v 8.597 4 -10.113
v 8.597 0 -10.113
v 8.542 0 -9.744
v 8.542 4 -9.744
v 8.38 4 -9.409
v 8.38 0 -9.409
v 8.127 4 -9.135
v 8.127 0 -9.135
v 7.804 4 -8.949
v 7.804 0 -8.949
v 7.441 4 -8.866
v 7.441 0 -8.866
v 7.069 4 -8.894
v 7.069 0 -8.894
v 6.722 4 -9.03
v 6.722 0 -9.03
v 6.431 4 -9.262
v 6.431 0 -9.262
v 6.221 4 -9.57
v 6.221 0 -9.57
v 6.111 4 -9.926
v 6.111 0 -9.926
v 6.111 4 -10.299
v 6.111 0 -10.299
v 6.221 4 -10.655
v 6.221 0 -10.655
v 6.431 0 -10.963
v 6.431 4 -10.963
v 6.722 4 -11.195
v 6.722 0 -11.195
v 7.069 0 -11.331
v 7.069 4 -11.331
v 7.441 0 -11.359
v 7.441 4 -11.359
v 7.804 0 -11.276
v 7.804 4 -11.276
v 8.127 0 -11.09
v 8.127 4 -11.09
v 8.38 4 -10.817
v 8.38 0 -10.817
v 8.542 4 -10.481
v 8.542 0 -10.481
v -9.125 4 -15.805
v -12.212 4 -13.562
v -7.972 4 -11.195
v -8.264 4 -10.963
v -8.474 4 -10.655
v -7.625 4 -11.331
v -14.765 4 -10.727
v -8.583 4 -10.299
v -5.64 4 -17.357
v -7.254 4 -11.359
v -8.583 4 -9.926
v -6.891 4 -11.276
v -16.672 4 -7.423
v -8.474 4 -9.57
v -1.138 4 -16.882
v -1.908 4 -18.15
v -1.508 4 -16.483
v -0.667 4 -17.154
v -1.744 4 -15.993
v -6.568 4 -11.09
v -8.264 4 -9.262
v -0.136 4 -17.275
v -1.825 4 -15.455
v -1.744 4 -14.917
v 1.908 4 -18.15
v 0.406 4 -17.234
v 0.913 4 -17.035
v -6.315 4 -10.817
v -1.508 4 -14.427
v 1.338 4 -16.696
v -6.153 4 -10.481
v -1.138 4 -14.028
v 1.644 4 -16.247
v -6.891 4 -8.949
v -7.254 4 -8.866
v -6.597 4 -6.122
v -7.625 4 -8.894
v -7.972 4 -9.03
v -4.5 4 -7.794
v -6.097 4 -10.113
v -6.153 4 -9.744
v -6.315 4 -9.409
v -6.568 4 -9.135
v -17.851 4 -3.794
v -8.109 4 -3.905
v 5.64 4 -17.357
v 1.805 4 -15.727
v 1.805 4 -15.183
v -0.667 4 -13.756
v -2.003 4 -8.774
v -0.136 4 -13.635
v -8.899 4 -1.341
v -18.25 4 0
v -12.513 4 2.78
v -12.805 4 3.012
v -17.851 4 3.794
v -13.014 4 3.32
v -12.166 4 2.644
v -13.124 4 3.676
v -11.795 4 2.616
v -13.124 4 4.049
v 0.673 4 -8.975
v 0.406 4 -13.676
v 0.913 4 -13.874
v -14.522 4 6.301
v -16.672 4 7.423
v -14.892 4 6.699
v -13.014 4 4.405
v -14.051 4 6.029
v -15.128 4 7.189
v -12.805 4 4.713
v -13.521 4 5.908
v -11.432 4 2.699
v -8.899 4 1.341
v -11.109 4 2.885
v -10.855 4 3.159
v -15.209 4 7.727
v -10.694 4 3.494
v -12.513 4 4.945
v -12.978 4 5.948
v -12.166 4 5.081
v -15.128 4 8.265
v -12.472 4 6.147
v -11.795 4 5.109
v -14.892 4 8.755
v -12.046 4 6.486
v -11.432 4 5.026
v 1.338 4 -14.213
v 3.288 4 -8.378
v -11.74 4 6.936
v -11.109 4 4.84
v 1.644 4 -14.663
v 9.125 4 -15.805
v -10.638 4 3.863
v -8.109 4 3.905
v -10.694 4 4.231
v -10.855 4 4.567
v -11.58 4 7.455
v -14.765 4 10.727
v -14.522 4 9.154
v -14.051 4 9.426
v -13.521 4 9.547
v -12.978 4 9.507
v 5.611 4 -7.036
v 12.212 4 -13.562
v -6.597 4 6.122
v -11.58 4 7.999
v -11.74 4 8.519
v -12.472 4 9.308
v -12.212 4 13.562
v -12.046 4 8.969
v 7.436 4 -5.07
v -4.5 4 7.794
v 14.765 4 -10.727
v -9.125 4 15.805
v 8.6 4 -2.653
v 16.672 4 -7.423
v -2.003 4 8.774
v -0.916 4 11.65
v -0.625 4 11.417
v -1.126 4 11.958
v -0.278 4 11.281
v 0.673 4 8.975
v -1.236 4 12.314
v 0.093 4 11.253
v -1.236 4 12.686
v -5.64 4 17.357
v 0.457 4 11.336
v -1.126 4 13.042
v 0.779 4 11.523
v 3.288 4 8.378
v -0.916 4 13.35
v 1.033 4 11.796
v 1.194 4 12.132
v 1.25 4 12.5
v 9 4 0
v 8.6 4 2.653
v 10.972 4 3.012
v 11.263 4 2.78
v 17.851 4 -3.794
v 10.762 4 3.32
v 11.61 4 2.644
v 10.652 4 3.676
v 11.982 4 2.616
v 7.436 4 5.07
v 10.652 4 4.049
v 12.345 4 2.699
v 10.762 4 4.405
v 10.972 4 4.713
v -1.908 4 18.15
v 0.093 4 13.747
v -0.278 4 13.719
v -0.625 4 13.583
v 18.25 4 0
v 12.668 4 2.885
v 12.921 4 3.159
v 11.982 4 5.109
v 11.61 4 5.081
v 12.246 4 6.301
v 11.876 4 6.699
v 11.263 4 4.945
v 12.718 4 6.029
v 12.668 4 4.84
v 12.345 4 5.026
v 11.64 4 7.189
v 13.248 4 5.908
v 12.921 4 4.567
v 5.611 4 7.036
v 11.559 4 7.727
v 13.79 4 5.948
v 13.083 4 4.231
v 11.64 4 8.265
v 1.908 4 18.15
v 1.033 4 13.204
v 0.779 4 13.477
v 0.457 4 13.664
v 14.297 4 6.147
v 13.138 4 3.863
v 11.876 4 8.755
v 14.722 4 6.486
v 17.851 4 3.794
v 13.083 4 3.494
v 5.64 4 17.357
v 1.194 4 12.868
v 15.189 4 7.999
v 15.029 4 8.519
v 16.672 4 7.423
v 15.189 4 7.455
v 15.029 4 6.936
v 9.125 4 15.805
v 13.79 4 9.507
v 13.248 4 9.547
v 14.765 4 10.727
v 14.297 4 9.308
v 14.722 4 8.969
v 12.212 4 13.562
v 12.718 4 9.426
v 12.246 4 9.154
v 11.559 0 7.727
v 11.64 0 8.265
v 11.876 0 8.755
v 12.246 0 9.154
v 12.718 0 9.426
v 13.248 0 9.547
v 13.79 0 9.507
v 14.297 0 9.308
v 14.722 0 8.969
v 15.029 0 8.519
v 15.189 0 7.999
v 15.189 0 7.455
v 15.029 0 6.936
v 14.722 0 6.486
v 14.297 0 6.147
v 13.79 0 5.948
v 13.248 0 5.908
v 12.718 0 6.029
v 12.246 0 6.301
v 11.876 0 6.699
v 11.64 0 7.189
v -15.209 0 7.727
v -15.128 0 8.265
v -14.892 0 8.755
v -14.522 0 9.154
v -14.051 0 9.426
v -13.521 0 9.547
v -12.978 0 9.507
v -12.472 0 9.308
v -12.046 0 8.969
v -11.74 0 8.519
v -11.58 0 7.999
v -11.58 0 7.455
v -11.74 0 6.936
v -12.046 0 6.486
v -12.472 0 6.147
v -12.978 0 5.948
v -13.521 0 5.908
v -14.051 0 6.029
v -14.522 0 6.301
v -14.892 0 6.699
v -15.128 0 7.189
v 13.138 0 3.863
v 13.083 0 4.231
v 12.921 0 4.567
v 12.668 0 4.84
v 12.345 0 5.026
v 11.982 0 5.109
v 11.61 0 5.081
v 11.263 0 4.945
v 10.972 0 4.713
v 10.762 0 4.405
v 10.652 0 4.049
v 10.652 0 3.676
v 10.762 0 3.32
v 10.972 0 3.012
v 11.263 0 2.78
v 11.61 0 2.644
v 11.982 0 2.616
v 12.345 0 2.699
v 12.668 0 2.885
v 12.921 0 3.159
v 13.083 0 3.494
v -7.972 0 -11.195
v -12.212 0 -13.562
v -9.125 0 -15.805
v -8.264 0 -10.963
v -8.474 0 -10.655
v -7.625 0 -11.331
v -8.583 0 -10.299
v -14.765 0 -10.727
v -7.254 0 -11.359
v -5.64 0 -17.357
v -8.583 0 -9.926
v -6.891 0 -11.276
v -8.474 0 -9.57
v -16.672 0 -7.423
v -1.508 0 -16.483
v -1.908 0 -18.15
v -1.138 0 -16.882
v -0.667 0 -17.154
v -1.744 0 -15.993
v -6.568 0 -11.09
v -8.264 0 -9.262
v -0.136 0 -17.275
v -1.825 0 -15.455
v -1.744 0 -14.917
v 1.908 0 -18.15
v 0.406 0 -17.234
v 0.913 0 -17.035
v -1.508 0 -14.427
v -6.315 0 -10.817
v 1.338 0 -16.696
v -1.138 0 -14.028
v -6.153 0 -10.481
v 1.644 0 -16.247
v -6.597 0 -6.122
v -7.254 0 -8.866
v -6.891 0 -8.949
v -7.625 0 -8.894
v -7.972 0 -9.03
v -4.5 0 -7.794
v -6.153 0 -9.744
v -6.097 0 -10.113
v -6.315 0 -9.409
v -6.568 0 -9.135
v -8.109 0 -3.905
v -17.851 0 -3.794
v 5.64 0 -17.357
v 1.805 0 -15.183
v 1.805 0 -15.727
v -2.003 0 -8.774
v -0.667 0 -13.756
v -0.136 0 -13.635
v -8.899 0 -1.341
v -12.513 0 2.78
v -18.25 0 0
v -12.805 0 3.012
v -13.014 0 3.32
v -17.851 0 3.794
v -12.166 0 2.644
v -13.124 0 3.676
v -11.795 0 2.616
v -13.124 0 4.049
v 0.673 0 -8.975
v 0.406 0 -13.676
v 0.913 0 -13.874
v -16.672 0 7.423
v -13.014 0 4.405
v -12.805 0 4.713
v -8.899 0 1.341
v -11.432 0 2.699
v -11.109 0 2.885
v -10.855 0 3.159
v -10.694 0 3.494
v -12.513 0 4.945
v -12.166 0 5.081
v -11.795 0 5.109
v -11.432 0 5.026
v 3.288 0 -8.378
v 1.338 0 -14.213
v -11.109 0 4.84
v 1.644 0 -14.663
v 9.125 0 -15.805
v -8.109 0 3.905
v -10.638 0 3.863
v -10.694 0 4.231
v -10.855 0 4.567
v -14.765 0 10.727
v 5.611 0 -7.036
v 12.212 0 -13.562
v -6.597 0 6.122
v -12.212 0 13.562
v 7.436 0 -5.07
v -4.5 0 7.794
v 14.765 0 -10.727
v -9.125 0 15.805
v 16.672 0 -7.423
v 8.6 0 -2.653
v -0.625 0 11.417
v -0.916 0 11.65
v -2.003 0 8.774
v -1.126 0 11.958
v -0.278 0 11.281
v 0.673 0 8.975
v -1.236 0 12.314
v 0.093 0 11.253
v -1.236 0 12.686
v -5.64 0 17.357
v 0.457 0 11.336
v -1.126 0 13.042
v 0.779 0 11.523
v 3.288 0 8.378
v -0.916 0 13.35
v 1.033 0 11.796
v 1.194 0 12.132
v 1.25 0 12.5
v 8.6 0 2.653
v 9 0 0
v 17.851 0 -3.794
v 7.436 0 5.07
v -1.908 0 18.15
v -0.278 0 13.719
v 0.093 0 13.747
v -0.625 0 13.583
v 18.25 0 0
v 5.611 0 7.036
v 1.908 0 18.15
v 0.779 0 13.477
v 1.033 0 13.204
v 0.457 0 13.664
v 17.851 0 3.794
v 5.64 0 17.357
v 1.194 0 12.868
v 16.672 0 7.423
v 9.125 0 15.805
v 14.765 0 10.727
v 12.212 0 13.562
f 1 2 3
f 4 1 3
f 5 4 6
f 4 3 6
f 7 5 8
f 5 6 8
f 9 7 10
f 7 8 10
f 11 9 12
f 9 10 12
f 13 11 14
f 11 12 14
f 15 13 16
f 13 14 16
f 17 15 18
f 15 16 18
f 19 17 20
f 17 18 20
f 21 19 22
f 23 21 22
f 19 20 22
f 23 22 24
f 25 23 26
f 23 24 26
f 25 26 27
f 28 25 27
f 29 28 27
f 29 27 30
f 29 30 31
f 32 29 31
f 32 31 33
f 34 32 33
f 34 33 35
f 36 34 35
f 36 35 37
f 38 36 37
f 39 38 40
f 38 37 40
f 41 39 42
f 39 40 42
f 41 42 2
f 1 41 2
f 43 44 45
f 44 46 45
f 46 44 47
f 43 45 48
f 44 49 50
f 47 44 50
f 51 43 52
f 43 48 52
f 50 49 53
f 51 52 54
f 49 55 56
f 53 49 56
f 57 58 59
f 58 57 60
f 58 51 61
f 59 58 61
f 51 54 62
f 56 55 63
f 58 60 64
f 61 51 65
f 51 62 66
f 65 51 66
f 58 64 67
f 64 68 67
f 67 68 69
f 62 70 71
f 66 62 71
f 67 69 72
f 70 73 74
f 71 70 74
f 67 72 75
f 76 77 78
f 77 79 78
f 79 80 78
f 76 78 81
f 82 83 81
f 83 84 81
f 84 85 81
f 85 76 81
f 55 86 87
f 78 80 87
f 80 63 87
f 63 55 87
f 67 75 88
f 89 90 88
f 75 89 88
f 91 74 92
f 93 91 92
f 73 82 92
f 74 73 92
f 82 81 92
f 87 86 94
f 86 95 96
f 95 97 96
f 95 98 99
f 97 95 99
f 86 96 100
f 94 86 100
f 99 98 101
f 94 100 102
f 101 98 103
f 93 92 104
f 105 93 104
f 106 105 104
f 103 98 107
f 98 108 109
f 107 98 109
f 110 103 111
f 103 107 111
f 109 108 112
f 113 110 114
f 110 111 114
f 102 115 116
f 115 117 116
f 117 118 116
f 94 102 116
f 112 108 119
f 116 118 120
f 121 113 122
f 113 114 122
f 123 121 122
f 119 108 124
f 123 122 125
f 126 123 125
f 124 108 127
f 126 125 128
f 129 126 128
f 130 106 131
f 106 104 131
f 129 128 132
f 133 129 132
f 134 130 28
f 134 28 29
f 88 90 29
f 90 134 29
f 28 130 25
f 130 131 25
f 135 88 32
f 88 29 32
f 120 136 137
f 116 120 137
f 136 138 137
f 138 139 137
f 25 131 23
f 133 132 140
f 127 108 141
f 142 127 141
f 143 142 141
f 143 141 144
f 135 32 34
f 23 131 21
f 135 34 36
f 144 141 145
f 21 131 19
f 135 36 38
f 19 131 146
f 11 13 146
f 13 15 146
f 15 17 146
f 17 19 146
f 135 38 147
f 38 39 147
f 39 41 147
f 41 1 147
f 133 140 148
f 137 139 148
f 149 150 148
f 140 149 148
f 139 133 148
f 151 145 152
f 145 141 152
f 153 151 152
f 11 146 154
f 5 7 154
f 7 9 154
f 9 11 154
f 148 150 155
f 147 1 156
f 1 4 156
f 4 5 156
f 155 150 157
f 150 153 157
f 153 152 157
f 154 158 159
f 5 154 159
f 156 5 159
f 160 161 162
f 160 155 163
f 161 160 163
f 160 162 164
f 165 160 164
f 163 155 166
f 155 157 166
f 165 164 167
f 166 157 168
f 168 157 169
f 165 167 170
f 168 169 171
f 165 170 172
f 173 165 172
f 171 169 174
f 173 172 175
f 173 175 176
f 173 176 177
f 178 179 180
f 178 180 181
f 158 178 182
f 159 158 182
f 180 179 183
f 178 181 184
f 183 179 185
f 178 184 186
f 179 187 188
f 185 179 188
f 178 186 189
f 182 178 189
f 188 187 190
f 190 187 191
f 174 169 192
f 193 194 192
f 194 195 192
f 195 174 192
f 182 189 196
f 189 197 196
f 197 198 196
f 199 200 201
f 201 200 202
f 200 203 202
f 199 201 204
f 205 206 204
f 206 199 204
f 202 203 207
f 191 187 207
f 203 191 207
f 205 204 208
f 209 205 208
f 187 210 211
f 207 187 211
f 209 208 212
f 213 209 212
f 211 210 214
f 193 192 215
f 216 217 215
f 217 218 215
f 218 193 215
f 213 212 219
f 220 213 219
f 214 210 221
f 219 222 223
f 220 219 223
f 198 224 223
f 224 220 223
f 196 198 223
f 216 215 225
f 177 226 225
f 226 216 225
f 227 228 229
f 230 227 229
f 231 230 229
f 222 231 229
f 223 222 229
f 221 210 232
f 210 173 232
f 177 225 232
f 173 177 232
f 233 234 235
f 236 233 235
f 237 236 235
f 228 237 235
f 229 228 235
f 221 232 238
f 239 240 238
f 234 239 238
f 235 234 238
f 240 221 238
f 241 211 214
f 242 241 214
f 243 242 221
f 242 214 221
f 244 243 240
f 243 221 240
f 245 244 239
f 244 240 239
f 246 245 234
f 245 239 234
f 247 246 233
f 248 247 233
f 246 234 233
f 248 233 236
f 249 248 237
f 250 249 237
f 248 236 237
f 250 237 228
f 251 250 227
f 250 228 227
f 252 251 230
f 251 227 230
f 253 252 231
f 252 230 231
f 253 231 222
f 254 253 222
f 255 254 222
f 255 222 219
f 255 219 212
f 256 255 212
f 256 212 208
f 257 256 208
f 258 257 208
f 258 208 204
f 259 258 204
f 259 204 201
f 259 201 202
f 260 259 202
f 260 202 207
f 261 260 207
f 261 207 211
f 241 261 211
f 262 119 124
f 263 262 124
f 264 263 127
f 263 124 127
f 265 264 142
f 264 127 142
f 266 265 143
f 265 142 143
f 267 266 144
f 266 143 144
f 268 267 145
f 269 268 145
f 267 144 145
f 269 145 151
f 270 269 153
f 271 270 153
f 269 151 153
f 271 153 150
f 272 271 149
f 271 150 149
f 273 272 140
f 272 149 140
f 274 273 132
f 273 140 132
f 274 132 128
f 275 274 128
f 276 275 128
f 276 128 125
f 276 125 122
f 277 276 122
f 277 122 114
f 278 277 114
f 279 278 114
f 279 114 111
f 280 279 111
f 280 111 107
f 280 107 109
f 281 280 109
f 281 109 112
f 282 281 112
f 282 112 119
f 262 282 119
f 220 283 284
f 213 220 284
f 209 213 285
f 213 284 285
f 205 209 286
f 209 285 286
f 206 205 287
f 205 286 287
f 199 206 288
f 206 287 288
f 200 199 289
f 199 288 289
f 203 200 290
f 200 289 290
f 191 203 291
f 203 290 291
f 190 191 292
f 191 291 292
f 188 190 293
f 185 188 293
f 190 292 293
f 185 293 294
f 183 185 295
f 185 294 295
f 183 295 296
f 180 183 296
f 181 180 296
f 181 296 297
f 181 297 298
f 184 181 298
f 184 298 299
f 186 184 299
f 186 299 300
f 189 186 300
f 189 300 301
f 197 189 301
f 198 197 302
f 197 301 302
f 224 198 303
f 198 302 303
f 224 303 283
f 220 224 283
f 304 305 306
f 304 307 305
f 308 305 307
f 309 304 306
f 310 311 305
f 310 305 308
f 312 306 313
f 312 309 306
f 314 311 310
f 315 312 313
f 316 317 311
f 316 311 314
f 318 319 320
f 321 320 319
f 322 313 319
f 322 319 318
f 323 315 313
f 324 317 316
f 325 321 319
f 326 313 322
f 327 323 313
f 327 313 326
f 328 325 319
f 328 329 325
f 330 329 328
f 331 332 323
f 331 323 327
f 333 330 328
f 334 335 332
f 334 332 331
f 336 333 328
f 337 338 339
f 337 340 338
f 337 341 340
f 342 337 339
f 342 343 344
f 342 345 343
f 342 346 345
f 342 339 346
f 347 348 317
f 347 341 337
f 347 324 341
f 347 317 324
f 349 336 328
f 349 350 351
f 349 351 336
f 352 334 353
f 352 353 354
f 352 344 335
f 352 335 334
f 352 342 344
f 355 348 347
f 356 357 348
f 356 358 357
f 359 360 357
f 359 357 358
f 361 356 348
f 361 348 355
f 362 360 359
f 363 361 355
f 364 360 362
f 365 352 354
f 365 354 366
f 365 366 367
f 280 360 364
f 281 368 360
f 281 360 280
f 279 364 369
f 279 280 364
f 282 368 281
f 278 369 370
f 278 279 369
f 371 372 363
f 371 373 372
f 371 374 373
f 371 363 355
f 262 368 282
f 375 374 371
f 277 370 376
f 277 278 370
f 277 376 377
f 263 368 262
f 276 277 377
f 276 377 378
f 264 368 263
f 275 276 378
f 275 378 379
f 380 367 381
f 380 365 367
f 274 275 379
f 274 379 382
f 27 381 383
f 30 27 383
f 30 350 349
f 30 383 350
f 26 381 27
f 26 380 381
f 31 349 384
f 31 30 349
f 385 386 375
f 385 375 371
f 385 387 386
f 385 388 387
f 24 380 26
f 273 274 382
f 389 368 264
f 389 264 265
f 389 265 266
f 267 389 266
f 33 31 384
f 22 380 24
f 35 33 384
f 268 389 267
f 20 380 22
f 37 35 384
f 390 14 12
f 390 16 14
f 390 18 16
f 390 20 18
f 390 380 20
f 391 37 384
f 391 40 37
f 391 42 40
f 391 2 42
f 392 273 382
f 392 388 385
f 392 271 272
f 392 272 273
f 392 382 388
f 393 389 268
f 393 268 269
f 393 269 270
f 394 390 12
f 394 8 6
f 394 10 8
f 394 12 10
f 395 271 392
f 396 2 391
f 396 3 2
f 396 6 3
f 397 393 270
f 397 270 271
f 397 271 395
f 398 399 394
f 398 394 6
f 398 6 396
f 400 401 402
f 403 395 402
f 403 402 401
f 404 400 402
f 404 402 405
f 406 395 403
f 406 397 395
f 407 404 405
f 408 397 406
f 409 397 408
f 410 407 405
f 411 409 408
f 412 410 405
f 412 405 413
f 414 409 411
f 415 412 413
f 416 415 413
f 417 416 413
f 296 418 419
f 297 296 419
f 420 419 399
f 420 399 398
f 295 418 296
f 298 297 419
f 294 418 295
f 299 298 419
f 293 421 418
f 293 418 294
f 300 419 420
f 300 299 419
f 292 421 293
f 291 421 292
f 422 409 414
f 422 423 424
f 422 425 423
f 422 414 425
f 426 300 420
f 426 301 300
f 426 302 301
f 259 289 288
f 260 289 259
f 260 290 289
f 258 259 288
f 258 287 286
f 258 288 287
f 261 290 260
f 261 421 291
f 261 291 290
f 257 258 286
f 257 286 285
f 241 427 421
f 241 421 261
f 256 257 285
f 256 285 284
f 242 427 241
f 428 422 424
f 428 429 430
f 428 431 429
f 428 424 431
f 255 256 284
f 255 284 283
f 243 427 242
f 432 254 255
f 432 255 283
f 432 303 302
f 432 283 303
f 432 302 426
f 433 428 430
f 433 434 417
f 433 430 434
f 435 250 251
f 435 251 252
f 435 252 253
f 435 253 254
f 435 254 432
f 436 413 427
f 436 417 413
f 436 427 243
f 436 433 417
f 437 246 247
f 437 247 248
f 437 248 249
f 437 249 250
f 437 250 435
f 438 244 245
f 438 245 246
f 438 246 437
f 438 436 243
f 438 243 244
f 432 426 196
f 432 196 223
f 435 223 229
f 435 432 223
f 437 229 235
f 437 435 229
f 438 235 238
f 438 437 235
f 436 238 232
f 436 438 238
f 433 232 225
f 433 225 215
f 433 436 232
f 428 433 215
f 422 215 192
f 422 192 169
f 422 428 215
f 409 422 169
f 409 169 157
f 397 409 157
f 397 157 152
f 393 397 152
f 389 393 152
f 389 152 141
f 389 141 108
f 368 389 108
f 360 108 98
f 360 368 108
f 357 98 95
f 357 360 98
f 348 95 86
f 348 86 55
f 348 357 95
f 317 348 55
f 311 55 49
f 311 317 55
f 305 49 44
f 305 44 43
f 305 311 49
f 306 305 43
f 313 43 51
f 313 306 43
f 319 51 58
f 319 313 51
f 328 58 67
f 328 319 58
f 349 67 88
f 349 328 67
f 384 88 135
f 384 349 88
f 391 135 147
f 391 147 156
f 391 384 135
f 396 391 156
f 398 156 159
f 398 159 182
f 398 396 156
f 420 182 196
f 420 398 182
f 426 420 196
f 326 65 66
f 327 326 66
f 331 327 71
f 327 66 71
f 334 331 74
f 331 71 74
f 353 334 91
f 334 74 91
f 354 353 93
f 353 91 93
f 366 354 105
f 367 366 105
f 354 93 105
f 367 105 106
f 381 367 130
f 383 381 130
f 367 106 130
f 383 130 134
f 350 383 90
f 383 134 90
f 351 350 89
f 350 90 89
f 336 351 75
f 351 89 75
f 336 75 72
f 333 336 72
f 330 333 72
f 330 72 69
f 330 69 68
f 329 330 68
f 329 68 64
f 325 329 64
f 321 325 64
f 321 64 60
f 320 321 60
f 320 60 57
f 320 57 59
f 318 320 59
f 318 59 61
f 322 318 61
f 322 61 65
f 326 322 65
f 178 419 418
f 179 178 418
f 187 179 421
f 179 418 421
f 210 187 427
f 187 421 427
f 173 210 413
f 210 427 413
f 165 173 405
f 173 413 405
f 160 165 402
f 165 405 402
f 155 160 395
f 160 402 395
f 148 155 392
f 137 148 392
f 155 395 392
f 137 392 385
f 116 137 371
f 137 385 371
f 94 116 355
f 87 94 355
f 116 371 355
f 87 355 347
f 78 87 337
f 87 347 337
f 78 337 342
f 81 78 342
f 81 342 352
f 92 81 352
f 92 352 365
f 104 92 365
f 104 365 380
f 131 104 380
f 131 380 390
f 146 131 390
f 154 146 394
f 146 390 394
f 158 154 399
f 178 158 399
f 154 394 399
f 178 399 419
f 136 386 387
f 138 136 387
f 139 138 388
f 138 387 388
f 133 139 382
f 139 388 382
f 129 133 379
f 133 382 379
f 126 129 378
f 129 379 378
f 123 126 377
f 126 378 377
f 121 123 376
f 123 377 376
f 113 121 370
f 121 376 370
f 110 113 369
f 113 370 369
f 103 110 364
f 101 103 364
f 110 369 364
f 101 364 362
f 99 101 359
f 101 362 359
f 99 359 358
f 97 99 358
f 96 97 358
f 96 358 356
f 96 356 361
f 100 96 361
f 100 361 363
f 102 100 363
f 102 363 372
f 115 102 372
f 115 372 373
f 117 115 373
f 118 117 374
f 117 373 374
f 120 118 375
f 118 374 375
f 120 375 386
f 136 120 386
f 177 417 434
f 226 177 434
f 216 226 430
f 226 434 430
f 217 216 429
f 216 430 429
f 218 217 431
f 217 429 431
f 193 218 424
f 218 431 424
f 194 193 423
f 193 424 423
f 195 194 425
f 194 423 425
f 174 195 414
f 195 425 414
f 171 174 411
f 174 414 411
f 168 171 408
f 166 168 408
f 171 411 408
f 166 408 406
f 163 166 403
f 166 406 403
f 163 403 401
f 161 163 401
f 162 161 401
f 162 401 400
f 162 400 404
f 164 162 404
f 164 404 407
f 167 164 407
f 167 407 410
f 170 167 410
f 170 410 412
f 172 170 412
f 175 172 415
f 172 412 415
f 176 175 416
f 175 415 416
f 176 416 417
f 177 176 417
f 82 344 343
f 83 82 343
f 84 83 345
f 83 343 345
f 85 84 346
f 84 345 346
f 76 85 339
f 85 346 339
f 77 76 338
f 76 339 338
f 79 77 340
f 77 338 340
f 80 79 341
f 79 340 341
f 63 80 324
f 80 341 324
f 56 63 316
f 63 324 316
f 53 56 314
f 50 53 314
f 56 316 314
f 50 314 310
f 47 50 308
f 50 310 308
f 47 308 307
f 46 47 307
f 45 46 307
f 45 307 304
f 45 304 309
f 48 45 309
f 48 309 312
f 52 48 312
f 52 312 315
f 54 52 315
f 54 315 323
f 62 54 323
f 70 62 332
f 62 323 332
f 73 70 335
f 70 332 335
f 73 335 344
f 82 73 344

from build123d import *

# Parameters (mm, degrees)
F0_R     = 18.25
F0_R_2   = 1.25
F0_R_3   = 9
F1_DEPTH = 4
F2_R     = 1.825
F3_DEPTH = 25


with BuildPart() as f1:
    # F0 (on Front) → F1 (new body)
    with BuildSketch(Plane.XZ):
        Circle(F0_R)
        with Locations((-7.347316, -10.112712)):
            Circle(F0_R_2, mode=Mode.SUBTRACT)
        with Locations((7.347316, -10.112712)):
            Circle(F0_R_2, mode=Mode.SUBTRACT)
        with Locations((-11.888206, 3.862712)):
            Circle(F0_R_2, mode=Mode.SUBTRACT)
        Circle(F0_R_3, mode=Mode.SUBTRACT)
        with Locations((11.888206, 3.862712)):
            Circle(F0_R_2, mode=Mode.SUBTRACT)
        with Locations((0, 12.5)):
            Circle(F0_R_2, mode=Mode.SUBTRACT)
    extrude(amount=-F1_DEPTH)

    # F2 (on face) → F3 (cut)
    with BuildSketch(Plane(origin=(0, 4, 0), x_dir=(-1, 0, 0), z_dir=(0, 1, 0))):
        with Locations((-13.384261, 7.727407)):
            Circle(F2_R)
        with Locations((13.384261, 7.727407)):
            Circle(F2_R)
        with Locations((0, -15.454813)):
            Circle(F2_R)
    extrude(amount=-F3_DEPTH, mode=Mode.SUBTRACT)


solid = f1.part
